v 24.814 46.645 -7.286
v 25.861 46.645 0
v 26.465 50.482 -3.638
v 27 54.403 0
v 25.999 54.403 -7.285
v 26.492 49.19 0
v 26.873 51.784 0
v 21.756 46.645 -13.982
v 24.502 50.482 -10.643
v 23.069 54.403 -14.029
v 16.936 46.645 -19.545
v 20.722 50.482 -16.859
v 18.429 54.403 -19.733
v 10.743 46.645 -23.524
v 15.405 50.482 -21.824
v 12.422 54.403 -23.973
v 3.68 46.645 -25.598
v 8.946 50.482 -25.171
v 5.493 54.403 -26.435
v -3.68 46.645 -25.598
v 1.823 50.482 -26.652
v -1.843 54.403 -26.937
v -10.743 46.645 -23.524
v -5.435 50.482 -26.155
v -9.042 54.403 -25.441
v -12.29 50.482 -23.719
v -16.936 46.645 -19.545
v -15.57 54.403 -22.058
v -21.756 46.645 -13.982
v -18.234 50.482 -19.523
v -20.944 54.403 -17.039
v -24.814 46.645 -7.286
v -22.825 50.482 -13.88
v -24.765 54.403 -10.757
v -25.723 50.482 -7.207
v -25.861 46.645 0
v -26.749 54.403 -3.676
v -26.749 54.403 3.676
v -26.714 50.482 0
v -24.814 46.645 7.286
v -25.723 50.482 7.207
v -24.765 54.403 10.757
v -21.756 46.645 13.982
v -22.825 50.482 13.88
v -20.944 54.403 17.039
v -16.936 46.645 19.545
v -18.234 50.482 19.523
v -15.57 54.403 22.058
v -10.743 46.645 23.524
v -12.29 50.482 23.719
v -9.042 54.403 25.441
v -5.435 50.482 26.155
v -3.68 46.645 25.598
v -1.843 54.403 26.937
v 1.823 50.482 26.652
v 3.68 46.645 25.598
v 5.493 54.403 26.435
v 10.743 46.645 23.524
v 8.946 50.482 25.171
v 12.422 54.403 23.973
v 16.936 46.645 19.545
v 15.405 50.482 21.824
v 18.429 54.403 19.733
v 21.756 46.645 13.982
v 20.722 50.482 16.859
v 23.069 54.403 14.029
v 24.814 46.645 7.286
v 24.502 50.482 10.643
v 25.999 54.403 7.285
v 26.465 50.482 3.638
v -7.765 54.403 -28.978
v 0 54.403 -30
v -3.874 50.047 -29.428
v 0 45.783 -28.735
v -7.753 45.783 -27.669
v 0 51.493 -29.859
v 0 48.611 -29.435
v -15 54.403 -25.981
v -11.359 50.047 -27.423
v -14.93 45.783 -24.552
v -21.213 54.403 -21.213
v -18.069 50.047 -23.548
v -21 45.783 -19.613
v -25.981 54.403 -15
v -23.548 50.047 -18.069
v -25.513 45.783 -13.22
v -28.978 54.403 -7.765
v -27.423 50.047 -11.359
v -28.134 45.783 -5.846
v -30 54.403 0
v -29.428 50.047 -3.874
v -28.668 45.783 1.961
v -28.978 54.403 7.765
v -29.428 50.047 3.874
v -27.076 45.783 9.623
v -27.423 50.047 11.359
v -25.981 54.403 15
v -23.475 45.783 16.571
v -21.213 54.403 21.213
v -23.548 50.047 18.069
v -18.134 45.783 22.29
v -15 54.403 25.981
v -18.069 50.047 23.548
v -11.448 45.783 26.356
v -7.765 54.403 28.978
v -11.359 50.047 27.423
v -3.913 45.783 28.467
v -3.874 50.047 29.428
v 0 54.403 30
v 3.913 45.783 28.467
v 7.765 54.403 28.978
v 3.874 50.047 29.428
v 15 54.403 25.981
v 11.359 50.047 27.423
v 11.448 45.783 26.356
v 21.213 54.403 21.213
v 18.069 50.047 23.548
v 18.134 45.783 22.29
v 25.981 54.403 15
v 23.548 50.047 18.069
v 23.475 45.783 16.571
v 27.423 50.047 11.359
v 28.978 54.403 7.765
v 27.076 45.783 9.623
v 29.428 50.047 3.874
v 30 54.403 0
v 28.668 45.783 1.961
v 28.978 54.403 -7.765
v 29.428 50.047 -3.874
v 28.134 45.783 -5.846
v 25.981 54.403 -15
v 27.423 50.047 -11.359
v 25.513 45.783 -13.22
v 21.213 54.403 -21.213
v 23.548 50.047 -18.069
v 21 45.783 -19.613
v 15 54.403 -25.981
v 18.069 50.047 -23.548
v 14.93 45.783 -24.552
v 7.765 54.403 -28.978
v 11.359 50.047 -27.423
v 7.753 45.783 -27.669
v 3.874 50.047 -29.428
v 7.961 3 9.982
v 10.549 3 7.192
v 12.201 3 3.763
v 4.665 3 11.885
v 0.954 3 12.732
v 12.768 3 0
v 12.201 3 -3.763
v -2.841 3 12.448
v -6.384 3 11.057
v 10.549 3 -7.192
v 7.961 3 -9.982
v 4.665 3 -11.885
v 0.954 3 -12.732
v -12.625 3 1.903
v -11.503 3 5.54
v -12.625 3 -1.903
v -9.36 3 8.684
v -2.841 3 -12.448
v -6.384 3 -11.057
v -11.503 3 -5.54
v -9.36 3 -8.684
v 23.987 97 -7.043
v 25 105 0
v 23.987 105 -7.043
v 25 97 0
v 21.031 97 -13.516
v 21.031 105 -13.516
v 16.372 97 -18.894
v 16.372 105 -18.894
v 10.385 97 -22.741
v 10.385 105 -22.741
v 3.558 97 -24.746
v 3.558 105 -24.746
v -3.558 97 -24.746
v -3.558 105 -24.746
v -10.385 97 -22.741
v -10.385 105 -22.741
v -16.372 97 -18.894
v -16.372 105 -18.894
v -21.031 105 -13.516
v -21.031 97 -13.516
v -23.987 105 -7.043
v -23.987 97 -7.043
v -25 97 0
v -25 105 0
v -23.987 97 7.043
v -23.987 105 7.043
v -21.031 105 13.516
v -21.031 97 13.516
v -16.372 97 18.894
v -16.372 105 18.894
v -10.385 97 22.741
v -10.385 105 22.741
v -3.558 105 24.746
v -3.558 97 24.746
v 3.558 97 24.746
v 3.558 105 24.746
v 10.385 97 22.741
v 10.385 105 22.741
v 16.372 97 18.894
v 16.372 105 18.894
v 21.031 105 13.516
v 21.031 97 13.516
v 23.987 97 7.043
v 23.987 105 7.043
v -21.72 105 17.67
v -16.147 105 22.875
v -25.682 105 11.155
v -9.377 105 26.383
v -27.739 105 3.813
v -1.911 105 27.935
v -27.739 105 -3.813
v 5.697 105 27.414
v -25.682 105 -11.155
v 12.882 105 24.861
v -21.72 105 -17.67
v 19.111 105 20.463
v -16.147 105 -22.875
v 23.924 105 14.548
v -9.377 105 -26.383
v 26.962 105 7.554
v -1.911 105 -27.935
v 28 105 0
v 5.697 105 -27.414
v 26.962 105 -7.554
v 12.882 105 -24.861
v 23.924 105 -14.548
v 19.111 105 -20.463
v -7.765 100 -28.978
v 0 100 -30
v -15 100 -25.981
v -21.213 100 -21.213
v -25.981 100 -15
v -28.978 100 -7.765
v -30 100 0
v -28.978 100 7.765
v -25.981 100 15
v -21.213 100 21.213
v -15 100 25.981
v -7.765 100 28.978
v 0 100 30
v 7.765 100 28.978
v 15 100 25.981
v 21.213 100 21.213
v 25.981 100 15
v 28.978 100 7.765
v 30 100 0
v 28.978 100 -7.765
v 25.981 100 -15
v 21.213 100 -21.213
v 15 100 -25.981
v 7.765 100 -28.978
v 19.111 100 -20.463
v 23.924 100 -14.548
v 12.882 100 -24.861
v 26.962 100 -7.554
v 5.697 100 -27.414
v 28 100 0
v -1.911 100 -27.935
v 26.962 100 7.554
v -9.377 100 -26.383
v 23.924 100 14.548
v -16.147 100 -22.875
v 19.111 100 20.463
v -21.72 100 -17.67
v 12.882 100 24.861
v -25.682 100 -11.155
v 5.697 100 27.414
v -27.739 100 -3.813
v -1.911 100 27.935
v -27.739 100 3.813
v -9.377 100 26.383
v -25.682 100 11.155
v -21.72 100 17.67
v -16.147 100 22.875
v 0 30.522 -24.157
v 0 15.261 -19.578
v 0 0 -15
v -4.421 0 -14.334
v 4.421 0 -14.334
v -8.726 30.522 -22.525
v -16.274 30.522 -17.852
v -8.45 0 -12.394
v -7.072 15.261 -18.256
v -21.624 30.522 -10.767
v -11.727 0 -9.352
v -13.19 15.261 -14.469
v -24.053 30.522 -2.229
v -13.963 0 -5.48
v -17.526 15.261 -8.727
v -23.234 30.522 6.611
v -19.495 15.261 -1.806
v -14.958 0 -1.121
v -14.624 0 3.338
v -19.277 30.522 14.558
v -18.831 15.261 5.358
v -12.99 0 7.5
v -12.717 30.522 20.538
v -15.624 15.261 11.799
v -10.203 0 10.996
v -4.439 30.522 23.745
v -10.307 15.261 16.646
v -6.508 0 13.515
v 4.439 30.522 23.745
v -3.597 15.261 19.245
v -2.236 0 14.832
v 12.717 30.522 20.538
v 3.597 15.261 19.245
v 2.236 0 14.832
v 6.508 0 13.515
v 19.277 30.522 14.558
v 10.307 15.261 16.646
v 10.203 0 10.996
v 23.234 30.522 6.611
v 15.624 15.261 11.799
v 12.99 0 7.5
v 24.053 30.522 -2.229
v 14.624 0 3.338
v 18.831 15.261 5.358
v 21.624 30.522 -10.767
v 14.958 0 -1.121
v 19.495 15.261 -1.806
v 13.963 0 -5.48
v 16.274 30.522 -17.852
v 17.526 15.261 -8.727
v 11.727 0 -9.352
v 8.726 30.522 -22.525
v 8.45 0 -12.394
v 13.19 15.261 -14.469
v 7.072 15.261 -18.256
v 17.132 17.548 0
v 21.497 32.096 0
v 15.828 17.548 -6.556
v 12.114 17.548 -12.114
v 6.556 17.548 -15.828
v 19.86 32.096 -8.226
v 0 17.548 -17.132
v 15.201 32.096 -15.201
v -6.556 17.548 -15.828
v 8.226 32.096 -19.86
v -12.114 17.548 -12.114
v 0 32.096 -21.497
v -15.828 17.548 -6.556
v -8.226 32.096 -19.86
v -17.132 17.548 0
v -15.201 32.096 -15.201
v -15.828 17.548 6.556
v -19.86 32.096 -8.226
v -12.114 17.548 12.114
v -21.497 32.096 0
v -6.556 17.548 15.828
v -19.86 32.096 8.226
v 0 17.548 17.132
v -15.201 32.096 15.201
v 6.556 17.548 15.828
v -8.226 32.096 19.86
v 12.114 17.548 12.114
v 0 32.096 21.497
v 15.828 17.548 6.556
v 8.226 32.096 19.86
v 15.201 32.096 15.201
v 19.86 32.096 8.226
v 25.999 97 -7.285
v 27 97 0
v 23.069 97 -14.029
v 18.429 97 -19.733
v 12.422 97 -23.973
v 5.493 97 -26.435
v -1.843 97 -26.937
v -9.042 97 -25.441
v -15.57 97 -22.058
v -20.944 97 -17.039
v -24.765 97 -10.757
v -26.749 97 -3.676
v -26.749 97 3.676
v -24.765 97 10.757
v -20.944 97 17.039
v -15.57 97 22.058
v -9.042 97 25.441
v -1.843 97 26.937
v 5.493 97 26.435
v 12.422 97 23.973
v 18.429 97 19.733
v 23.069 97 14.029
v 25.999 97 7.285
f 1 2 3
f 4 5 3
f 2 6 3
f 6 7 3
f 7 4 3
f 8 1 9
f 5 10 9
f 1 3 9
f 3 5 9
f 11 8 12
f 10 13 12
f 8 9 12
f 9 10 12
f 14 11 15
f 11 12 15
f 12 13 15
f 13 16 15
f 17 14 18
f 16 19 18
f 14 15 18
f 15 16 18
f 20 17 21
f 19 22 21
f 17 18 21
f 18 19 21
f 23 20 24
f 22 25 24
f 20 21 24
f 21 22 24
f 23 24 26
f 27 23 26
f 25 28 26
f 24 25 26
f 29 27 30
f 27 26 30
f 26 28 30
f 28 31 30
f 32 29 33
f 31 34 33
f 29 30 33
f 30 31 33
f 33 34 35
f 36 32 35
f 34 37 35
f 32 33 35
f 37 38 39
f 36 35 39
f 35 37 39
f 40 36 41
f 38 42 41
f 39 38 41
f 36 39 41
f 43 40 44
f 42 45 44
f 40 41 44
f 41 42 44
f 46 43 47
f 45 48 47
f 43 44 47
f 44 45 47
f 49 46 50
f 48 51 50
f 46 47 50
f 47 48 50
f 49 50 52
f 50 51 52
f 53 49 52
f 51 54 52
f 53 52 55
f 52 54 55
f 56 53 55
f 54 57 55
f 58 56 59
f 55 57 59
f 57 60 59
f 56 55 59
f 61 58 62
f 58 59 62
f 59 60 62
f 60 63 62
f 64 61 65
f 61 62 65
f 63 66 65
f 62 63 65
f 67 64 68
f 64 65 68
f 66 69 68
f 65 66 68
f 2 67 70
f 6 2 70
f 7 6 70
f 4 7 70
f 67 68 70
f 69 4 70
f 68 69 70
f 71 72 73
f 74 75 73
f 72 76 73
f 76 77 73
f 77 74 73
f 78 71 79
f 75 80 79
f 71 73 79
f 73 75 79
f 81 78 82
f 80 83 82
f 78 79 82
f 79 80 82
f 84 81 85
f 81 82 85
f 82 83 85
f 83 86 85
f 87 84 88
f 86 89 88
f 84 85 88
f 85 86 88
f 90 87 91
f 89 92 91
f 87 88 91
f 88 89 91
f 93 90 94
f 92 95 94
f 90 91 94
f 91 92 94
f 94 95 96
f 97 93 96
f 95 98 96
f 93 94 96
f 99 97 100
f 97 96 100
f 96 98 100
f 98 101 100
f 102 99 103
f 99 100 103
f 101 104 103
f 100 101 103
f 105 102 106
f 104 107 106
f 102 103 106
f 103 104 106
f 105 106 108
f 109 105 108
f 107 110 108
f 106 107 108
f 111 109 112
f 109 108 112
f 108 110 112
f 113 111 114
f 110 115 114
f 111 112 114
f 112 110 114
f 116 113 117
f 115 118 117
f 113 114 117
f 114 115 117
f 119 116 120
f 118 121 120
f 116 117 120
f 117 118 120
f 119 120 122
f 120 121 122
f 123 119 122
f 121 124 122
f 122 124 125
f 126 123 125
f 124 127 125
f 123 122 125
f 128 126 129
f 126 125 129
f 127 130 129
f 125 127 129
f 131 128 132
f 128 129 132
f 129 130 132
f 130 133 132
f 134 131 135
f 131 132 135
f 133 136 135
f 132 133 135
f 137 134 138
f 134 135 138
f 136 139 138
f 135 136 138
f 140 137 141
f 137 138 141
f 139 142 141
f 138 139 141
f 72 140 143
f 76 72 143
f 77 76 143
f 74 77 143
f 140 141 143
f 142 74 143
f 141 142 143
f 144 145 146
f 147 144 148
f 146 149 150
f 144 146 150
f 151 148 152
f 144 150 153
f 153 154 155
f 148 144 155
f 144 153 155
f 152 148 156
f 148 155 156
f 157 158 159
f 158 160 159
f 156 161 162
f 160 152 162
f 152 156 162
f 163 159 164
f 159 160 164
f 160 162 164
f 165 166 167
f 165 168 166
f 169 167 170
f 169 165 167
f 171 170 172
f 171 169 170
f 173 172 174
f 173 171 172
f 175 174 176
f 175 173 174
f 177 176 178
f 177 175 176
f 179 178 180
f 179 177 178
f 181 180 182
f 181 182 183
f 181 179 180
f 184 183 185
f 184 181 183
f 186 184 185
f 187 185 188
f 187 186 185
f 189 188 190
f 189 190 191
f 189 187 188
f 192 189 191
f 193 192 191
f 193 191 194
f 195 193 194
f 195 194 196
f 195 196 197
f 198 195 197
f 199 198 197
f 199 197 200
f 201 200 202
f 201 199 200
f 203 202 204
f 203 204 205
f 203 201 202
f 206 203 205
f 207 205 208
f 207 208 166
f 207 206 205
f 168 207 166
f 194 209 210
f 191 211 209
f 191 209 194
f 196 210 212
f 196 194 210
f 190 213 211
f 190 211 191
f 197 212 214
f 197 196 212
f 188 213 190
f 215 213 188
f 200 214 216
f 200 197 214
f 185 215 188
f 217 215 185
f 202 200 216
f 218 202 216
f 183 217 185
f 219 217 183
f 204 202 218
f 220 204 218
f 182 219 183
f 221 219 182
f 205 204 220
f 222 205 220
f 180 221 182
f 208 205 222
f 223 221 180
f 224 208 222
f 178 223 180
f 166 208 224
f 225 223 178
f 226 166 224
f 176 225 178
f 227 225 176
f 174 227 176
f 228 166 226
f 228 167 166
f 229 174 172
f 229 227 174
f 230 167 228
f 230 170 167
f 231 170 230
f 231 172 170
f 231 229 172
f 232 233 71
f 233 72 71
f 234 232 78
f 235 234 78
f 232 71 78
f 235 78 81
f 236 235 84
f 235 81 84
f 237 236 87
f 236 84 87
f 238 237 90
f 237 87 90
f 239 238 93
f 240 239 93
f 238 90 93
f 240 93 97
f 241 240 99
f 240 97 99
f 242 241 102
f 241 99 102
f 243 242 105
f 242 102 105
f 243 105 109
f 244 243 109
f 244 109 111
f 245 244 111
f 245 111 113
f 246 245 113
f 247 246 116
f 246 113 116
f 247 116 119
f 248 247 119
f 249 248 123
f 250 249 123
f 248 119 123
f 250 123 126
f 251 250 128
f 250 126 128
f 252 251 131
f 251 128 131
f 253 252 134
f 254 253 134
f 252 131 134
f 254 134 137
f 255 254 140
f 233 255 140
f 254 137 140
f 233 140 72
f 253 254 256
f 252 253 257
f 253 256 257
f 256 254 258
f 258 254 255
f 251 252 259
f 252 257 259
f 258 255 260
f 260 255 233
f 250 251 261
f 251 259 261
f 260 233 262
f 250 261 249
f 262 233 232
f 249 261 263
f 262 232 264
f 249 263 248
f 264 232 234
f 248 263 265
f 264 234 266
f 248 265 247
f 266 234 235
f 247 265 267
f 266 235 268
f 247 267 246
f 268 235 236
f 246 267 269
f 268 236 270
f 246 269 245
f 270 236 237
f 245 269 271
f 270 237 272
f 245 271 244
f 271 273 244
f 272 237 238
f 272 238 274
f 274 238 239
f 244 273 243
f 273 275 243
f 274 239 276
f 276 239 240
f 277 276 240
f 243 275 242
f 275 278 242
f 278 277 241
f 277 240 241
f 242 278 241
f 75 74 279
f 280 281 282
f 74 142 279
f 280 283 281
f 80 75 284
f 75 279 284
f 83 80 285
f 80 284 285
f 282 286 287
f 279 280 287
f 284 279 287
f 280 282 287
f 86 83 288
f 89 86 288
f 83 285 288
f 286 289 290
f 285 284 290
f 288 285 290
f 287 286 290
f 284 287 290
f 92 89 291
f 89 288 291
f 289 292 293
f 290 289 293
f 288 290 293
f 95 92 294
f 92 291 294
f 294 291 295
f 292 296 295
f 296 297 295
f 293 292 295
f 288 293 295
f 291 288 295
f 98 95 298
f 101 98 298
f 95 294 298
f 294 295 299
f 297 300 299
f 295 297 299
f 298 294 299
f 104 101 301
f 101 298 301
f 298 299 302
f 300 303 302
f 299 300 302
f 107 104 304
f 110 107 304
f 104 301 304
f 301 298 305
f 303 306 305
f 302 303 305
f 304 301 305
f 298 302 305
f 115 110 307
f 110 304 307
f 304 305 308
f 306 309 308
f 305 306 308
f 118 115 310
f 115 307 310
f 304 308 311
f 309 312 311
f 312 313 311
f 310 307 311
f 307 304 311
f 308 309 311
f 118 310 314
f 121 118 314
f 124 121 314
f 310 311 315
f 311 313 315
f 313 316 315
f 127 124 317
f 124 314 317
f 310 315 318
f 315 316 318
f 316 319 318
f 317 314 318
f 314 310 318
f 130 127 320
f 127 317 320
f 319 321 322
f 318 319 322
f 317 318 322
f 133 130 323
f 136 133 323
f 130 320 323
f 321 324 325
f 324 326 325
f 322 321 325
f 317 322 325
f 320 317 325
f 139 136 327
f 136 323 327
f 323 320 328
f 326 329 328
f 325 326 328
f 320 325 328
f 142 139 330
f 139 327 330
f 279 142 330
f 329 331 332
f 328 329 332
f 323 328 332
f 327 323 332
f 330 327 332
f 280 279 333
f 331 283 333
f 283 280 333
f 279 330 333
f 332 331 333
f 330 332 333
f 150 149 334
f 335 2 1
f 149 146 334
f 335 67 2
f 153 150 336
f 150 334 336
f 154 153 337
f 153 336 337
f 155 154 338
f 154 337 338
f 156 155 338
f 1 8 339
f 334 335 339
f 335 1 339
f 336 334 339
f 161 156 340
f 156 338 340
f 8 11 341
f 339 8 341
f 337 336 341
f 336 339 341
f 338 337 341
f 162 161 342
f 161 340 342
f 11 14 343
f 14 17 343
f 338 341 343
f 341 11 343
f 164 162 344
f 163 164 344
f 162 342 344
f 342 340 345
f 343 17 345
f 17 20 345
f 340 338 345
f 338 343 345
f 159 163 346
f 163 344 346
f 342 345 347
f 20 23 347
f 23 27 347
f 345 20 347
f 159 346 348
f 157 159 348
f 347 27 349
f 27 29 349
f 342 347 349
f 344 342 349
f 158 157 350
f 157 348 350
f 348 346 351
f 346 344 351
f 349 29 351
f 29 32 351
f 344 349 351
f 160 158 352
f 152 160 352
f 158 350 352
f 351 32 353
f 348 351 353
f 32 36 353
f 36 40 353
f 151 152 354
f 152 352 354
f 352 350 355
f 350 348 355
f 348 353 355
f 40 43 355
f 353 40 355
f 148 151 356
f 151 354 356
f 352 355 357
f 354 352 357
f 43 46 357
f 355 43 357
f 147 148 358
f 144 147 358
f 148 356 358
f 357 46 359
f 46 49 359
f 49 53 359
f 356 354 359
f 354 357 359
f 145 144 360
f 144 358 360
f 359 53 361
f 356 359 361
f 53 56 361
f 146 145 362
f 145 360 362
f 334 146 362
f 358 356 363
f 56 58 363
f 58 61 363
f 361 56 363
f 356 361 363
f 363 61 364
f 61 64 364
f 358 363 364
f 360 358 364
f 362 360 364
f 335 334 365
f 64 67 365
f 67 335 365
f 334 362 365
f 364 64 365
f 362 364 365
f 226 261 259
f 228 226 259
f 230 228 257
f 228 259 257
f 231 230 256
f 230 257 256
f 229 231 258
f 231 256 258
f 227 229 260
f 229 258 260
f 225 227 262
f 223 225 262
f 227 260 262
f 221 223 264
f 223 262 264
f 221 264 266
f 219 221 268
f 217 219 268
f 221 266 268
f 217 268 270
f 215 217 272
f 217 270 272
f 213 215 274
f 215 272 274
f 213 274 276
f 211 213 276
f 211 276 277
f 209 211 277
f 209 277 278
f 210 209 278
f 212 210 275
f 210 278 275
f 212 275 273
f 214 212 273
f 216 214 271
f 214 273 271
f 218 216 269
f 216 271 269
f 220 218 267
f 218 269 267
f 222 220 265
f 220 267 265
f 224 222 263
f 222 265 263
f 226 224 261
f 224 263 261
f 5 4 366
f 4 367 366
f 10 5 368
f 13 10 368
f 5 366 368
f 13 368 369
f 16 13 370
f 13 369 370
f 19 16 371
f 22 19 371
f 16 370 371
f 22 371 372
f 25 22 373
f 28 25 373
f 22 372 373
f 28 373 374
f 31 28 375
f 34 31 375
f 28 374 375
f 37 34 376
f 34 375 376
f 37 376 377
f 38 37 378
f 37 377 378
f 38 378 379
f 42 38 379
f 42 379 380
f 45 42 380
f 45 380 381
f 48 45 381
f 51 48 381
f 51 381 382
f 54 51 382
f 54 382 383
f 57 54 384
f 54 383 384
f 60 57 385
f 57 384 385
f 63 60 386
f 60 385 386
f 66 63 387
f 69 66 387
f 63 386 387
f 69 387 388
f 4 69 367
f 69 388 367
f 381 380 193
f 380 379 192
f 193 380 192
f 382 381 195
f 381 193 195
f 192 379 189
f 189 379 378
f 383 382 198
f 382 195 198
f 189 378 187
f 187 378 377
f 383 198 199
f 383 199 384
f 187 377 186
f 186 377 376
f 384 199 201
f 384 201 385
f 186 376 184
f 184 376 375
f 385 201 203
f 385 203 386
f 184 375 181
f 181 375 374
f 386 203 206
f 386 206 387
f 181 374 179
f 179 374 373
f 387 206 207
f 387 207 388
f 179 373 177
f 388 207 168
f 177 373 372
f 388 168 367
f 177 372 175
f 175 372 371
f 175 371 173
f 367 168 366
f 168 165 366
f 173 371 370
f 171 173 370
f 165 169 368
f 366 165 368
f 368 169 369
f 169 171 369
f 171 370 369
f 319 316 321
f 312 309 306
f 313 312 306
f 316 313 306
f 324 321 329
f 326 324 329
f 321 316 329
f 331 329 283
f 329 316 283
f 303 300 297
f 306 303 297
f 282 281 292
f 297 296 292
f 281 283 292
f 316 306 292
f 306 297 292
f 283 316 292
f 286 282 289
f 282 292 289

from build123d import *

# Parameters (mm, degrees)
SKETCH4_R           = 28
SKETCH4_R_2         = 25
EXTRUDE_THIN2_DEPTH = 5


# Read off the part's stored shape, not the designer's step: Shell1
with BuildPart() as part:
    # Sketch1 → Revolve1 (revolve)
    with BuildSketch(Plane.XY, mode=Mode.PRIVATE) as revolve1_sk:
        with BuildLine():
            Line((0, 0), (0, 100))
            Line((0, 100), (30, 100))
            Line((30, 100), (30, 54.403065089))
            ThreePointArc((30, 54.403065089), (29.682011865, 50.046670749), (28.734788557, 45.782628522))
            Line((28.734788557, 45.782628522), (15, 0))
            Line((15, 0), (0, 0))
        make_face()
    revolve(revolve1_sk.sketch.rotate(Axis((0, 0, 0), (0, 1, 0)), 90), axis=Axis((0, 0, 0), (0, 1, 0)))

    # Sketch4 → Extrude-Thin2 (add)
    with BuildSketch(Plane(origin=(0, 100, 0), x_dir=(1, 0, 0), z_dir=(0, 1, 0))):
        Circle(SKETCH4_R)
        Circle(SKETCH4_R_2, mode=Mode.SUBTRACT)
    extrude(amount=EXTRUDE_THIN2_DEPTH)

    # Shell1 outline → Shell1 (revolve, cut)
    with BuildSketch(Plane.XY):
        with BuildLine():
            Line((25, 97), (25, 100))
            Line((25, 100), (0, 100))
            Line((0, 100), (0, 3))
            Line((0, 3), (12.767908047, 3))
            Line((12.767908047, 3), (25.861309693, 46.644672153))
            ThreePointArc((25.861309693, 46.644672153), (26.713810678, 50.482310183), (27, 54.403065116))
            Line((27, 54.403065116), (27, 97))
            Line((27, 97), (25, 97))
        make_face()
    revolve(axis=Axis((0, 0, 0), (0, 1, 0)), mode=Mode.SUBTRACT)


solid = part.part
